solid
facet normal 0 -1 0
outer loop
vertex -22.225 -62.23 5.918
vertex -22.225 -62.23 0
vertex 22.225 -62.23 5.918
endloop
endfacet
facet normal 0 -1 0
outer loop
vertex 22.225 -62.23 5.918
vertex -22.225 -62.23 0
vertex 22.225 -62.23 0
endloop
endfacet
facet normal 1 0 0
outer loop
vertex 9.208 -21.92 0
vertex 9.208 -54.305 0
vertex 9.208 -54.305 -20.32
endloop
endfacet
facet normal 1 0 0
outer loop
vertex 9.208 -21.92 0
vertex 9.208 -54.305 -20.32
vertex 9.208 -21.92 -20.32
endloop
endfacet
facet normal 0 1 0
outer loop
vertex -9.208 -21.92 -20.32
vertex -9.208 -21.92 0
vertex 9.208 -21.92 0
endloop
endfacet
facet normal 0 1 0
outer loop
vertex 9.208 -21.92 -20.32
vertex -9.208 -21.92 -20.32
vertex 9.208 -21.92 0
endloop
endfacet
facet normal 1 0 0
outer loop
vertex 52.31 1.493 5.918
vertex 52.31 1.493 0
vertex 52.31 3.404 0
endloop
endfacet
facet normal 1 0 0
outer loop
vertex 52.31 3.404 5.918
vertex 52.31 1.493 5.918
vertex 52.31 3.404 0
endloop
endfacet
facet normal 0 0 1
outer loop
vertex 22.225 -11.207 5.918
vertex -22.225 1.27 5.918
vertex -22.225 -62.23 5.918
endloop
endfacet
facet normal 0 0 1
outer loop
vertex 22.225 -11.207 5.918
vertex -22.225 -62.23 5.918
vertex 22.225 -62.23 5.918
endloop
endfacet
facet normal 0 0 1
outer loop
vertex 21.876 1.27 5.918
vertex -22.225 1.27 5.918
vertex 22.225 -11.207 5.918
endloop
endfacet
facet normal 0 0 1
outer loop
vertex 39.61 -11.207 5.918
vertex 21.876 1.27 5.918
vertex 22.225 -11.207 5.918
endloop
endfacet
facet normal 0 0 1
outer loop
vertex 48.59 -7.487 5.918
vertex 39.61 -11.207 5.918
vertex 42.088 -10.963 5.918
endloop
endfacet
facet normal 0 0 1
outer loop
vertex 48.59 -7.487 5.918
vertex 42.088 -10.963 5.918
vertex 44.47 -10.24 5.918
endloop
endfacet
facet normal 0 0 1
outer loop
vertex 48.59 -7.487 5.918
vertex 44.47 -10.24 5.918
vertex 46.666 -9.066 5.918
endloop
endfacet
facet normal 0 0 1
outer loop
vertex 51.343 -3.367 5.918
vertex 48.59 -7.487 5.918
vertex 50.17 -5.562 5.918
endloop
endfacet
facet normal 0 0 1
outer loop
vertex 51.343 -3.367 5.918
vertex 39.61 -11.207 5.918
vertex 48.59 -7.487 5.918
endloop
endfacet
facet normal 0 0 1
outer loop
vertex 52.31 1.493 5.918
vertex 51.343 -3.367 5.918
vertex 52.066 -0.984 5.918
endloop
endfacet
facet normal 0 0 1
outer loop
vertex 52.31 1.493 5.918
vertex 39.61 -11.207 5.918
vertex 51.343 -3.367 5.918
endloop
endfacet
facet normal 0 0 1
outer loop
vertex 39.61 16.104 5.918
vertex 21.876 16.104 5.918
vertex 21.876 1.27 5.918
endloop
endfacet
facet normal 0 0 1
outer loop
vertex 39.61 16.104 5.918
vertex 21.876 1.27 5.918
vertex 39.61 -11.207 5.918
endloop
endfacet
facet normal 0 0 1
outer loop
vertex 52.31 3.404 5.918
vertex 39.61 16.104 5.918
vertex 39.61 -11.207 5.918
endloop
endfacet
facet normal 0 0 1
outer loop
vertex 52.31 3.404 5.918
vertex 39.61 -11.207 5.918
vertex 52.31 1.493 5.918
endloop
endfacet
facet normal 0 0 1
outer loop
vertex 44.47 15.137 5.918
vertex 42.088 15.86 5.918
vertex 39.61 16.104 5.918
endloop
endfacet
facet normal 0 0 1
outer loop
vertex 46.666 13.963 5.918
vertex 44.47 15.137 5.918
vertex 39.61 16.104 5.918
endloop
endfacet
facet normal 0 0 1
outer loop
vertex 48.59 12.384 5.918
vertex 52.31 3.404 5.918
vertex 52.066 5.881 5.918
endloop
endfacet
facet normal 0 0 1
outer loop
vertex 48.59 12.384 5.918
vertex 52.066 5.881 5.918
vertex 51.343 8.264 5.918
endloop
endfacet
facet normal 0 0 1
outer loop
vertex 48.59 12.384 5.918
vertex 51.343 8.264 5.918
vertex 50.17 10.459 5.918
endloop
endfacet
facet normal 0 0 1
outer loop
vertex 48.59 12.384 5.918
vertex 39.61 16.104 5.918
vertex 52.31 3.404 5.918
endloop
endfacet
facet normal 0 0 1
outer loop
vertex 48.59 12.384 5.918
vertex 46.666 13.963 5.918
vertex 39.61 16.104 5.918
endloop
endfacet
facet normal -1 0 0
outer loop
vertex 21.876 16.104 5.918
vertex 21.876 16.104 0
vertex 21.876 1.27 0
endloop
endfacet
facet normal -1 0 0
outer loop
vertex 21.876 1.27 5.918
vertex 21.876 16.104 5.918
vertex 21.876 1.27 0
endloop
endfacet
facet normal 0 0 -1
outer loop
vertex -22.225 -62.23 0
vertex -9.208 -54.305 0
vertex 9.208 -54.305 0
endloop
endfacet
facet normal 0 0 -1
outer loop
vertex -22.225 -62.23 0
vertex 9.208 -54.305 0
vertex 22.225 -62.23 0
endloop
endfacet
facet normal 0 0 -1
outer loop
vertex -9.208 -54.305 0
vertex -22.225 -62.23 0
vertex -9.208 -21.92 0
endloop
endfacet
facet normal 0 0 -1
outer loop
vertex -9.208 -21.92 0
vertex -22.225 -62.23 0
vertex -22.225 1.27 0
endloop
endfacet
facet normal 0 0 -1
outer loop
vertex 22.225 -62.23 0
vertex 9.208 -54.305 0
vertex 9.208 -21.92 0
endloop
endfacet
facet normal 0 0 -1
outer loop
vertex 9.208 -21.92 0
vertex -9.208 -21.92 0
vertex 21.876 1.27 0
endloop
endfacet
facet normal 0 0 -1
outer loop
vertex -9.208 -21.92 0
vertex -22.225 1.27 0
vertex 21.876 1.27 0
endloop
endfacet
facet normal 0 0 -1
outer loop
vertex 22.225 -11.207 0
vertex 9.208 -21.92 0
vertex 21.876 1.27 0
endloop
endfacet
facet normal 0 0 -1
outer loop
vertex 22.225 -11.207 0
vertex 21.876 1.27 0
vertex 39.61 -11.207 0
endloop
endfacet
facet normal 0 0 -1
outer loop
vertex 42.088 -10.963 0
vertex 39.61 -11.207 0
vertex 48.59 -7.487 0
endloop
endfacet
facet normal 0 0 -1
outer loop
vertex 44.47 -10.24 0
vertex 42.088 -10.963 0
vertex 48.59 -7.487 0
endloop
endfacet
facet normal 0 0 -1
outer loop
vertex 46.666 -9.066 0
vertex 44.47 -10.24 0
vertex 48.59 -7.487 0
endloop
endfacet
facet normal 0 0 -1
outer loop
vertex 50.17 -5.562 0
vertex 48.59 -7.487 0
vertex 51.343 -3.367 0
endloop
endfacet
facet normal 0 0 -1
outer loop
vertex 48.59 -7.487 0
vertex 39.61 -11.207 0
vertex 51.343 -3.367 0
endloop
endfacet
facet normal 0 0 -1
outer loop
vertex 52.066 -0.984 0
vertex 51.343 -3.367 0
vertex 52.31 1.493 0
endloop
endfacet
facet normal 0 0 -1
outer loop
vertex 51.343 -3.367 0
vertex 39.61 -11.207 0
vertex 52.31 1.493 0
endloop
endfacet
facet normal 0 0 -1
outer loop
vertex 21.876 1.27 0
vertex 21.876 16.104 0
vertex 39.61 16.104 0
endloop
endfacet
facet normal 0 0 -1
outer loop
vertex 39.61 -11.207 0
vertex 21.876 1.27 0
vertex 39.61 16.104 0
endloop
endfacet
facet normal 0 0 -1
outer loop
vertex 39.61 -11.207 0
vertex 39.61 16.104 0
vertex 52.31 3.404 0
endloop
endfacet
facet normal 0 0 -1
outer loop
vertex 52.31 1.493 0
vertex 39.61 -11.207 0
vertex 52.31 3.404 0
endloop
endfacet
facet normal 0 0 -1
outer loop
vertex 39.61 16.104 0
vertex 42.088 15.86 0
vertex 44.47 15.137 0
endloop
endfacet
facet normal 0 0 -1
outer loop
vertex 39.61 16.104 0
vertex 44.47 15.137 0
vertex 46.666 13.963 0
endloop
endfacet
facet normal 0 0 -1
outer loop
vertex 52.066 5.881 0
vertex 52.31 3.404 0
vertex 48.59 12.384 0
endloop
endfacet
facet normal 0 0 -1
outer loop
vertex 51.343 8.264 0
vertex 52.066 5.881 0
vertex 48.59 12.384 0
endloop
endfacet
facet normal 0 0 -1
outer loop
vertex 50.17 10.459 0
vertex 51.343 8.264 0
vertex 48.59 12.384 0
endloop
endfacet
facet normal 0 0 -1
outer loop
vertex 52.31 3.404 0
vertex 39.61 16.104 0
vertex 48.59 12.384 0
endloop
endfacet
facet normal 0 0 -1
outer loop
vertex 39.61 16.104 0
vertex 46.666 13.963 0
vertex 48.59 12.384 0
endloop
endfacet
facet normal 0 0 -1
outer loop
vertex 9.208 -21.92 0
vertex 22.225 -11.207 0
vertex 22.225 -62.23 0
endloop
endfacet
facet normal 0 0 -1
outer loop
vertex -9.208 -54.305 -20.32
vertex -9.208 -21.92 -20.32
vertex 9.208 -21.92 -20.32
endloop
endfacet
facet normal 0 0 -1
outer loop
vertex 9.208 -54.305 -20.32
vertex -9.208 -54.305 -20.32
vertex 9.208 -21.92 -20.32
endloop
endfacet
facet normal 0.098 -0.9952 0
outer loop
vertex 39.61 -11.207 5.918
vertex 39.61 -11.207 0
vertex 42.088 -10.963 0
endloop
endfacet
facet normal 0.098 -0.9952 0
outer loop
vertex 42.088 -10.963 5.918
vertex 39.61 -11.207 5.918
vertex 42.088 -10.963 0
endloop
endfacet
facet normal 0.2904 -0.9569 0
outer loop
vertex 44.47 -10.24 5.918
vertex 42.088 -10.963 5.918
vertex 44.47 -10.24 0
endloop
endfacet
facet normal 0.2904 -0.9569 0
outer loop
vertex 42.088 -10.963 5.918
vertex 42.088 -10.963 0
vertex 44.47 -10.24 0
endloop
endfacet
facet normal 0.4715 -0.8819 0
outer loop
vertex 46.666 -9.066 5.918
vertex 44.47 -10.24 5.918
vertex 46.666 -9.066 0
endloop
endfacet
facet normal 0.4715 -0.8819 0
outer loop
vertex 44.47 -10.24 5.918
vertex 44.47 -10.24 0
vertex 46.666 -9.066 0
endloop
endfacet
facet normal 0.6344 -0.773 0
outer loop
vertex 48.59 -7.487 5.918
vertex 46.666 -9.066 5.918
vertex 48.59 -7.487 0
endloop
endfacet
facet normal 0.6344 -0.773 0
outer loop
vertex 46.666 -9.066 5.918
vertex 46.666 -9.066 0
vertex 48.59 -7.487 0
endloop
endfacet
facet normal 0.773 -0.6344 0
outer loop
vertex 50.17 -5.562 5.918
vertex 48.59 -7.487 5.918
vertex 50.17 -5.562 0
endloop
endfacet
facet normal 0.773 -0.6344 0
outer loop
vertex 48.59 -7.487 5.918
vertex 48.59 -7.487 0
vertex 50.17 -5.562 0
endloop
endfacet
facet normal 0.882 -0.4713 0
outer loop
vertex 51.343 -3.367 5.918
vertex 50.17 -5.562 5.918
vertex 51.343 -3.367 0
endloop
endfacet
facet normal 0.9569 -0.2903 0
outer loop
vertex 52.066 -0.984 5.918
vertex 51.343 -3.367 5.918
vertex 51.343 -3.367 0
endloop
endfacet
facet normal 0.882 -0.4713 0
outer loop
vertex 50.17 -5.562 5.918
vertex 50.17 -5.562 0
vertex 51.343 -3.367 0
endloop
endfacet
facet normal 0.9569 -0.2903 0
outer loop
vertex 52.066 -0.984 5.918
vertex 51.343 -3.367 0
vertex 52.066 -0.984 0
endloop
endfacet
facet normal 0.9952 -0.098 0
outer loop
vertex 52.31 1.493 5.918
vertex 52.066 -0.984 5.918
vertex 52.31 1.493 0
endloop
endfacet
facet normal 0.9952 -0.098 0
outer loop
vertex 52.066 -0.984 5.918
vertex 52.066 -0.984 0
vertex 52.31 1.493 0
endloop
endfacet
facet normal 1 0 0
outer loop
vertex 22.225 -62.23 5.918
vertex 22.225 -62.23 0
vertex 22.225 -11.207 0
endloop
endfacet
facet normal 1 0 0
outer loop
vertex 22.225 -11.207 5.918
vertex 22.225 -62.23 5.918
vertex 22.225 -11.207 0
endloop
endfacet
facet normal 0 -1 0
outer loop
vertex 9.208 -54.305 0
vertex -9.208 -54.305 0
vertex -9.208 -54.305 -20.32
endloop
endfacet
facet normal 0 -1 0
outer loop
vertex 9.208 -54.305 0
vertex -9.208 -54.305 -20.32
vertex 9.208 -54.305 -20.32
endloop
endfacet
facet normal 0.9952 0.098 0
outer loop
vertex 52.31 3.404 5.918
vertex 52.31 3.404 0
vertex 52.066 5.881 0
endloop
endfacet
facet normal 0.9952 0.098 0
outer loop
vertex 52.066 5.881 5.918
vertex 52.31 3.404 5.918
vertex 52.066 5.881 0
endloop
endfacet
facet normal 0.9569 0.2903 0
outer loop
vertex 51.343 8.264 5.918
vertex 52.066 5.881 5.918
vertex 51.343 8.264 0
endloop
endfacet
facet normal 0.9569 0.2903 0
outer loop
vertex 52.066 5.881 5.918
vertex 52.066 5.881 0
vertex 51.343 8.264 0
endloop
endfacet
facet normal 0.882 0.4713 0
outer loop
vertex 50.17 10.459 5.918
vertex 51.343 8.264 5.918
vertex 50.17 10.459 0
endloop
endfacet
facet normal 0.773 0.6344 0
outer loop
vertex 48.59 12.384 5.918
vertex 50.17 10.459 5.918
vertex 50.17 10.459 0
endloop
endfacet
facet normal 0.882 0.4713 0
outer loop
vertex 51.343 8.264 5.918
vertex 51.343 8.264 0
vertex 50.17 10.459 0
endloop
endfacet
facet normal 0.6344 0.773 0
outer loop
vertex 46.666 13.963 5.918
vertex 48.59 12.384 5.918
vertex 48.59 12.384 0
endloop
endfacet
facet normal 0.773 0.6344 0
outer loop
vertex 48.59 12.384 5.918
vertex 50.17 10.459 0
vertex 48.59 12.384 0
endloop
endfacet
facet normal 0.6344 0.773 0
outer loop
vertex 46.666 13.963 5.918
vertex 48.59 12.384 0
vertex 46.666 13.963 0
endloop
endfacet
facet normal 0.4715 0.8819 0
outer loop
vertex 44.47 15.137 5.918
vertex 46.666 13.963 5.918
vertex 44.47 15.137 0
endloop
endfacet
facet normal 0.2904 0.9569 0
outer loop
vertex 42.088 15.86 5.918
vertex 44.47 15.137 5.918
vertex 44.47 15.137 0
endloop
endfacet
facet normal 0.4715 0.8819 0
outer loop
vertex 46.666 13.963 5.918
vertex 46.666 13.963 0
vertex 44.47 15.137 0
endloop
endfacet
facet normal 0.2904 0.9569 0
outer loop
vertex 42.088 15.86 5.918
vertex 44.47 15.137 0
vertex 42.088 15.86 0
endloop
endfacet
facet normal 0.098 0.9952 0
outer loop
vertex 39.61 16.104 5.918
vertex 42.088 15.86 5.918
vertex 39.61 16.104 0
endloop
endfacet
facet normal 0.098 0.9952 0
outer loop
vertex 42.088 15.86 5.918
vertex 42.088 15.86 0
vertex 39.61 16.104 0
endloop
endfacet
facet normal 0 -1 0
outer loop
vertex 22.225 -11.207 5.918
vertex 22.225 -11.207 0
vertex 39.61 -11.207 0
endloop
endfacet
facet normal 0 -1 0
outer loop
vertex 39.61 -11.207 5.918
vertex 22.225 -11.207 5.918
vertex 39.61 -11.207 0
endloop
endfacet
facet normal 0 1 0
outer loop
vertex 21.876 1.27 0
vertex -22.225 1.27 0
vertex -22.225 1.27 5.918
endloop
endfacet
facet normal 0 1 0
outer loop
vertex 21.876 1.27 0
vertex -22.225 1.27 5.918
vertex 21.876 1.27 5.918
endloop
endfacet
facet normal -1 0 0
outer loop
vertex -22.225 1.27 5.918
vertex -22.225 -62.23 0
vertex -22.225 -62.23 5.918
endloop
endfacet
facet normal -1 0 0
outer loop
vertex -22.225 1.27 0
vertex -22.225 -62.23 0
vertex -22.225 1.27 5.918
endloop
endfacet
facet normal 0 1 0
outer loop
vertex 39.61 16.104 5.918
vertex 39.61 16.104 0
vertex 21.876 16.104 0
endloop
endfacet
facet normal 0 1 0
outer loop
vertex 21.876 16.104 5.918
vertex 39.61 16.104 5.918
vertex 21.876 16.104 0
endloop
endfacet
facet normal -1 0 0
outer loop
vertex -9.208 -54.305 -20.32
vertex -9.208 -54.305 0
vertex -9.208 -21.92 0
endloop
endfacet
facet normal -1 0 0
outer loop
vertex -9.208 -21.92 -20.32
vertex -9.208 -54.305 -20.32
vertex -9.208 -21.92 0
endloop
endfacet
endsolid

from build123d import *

# Parameters (mm, degrees)
F2_DEPTH = 5.9182
F0_W     = 44.45
F0_H     = 63.5
F3_DEPTH = 5.9182
F4_W     = 18.415
F4_H     = 32.385
F5_DEPTH = 20.32


with BuildPart() as f2:
    # F1 (on Top) → F2 (new body)
    with BuildSketch(Plane.XY):
        with BuildLine():
            Line((39.6100495338, 16.1036532372), (21.8759961426, 16.1036532372))
            Line((21.8759961426, 16.1036532372), (21.8759961426, -11.2066548318))
            Line((21.8759961426, -11.2066548318), (39.6100495338, -11.2066548318))
            ThreePointArc((39.6100495338, -11.2066548318), (48.5903056549, -7.4869109528), (52.3100495338, 1.4933451682))
            Line((52.3100495338, 1.4933451682), (52.3100495338, 3.4036532372))
            ThreePointArc((52.3100495338, 3.4036532372), (48.5903056549, 12.3839093583), (39.6100495338, 16.1036532372))
        make_face()
    extrude(amount=F2_DEPTH)

    # F0 (on Top) + F2_face (on face) → F3 (join)
    with BuildSketch(Plane.XY):
        with Locations((0, -30.48)):
            Rectangle(F0_W, F0_H)
    with BuildSketch(Plane(origin=(35.9682073334, 2.4484992027, 0), x_dir=(1, 0, 0), z_dir=(0, 0, -1))):
        with BuildLine():
            Line((-14.0922111908, -13.6551540345), (3.6418422005, -13.6551540345))
            ThreePointArc((3.6418422005, -13.6551540345), (12.6220983215, -9.9354101556), (16.3418422005, -0.9551540345))
            Line((16.3418422005, -0.9551540345), (16.3418422005, 0.9551540345))
            ThreePointArc((16.3418422005, 0.9551540345), (12.6220983215, 9.9354101556), (3.6418422005, 13.6551540345))
            Line((3.6418422005, 13.6551540345), (-14.0922111908, 13.6551540345))
            Line((-14.0922111908, 13.6551540345), (-14.0922111908, -13.6551540345))
        make_face()
    extrude(amount=F3_DEPTH, dir=(0, 0, 1))

    # F4 (on Top) → F5 (join)
    with BuildSketch(Plane.XY):
        with Locations((0, -38.1122922906)):
            Rectangle(F4_W, F4_H)
    extrude(amount=-F5_DEPTH)


solid = f2.part
